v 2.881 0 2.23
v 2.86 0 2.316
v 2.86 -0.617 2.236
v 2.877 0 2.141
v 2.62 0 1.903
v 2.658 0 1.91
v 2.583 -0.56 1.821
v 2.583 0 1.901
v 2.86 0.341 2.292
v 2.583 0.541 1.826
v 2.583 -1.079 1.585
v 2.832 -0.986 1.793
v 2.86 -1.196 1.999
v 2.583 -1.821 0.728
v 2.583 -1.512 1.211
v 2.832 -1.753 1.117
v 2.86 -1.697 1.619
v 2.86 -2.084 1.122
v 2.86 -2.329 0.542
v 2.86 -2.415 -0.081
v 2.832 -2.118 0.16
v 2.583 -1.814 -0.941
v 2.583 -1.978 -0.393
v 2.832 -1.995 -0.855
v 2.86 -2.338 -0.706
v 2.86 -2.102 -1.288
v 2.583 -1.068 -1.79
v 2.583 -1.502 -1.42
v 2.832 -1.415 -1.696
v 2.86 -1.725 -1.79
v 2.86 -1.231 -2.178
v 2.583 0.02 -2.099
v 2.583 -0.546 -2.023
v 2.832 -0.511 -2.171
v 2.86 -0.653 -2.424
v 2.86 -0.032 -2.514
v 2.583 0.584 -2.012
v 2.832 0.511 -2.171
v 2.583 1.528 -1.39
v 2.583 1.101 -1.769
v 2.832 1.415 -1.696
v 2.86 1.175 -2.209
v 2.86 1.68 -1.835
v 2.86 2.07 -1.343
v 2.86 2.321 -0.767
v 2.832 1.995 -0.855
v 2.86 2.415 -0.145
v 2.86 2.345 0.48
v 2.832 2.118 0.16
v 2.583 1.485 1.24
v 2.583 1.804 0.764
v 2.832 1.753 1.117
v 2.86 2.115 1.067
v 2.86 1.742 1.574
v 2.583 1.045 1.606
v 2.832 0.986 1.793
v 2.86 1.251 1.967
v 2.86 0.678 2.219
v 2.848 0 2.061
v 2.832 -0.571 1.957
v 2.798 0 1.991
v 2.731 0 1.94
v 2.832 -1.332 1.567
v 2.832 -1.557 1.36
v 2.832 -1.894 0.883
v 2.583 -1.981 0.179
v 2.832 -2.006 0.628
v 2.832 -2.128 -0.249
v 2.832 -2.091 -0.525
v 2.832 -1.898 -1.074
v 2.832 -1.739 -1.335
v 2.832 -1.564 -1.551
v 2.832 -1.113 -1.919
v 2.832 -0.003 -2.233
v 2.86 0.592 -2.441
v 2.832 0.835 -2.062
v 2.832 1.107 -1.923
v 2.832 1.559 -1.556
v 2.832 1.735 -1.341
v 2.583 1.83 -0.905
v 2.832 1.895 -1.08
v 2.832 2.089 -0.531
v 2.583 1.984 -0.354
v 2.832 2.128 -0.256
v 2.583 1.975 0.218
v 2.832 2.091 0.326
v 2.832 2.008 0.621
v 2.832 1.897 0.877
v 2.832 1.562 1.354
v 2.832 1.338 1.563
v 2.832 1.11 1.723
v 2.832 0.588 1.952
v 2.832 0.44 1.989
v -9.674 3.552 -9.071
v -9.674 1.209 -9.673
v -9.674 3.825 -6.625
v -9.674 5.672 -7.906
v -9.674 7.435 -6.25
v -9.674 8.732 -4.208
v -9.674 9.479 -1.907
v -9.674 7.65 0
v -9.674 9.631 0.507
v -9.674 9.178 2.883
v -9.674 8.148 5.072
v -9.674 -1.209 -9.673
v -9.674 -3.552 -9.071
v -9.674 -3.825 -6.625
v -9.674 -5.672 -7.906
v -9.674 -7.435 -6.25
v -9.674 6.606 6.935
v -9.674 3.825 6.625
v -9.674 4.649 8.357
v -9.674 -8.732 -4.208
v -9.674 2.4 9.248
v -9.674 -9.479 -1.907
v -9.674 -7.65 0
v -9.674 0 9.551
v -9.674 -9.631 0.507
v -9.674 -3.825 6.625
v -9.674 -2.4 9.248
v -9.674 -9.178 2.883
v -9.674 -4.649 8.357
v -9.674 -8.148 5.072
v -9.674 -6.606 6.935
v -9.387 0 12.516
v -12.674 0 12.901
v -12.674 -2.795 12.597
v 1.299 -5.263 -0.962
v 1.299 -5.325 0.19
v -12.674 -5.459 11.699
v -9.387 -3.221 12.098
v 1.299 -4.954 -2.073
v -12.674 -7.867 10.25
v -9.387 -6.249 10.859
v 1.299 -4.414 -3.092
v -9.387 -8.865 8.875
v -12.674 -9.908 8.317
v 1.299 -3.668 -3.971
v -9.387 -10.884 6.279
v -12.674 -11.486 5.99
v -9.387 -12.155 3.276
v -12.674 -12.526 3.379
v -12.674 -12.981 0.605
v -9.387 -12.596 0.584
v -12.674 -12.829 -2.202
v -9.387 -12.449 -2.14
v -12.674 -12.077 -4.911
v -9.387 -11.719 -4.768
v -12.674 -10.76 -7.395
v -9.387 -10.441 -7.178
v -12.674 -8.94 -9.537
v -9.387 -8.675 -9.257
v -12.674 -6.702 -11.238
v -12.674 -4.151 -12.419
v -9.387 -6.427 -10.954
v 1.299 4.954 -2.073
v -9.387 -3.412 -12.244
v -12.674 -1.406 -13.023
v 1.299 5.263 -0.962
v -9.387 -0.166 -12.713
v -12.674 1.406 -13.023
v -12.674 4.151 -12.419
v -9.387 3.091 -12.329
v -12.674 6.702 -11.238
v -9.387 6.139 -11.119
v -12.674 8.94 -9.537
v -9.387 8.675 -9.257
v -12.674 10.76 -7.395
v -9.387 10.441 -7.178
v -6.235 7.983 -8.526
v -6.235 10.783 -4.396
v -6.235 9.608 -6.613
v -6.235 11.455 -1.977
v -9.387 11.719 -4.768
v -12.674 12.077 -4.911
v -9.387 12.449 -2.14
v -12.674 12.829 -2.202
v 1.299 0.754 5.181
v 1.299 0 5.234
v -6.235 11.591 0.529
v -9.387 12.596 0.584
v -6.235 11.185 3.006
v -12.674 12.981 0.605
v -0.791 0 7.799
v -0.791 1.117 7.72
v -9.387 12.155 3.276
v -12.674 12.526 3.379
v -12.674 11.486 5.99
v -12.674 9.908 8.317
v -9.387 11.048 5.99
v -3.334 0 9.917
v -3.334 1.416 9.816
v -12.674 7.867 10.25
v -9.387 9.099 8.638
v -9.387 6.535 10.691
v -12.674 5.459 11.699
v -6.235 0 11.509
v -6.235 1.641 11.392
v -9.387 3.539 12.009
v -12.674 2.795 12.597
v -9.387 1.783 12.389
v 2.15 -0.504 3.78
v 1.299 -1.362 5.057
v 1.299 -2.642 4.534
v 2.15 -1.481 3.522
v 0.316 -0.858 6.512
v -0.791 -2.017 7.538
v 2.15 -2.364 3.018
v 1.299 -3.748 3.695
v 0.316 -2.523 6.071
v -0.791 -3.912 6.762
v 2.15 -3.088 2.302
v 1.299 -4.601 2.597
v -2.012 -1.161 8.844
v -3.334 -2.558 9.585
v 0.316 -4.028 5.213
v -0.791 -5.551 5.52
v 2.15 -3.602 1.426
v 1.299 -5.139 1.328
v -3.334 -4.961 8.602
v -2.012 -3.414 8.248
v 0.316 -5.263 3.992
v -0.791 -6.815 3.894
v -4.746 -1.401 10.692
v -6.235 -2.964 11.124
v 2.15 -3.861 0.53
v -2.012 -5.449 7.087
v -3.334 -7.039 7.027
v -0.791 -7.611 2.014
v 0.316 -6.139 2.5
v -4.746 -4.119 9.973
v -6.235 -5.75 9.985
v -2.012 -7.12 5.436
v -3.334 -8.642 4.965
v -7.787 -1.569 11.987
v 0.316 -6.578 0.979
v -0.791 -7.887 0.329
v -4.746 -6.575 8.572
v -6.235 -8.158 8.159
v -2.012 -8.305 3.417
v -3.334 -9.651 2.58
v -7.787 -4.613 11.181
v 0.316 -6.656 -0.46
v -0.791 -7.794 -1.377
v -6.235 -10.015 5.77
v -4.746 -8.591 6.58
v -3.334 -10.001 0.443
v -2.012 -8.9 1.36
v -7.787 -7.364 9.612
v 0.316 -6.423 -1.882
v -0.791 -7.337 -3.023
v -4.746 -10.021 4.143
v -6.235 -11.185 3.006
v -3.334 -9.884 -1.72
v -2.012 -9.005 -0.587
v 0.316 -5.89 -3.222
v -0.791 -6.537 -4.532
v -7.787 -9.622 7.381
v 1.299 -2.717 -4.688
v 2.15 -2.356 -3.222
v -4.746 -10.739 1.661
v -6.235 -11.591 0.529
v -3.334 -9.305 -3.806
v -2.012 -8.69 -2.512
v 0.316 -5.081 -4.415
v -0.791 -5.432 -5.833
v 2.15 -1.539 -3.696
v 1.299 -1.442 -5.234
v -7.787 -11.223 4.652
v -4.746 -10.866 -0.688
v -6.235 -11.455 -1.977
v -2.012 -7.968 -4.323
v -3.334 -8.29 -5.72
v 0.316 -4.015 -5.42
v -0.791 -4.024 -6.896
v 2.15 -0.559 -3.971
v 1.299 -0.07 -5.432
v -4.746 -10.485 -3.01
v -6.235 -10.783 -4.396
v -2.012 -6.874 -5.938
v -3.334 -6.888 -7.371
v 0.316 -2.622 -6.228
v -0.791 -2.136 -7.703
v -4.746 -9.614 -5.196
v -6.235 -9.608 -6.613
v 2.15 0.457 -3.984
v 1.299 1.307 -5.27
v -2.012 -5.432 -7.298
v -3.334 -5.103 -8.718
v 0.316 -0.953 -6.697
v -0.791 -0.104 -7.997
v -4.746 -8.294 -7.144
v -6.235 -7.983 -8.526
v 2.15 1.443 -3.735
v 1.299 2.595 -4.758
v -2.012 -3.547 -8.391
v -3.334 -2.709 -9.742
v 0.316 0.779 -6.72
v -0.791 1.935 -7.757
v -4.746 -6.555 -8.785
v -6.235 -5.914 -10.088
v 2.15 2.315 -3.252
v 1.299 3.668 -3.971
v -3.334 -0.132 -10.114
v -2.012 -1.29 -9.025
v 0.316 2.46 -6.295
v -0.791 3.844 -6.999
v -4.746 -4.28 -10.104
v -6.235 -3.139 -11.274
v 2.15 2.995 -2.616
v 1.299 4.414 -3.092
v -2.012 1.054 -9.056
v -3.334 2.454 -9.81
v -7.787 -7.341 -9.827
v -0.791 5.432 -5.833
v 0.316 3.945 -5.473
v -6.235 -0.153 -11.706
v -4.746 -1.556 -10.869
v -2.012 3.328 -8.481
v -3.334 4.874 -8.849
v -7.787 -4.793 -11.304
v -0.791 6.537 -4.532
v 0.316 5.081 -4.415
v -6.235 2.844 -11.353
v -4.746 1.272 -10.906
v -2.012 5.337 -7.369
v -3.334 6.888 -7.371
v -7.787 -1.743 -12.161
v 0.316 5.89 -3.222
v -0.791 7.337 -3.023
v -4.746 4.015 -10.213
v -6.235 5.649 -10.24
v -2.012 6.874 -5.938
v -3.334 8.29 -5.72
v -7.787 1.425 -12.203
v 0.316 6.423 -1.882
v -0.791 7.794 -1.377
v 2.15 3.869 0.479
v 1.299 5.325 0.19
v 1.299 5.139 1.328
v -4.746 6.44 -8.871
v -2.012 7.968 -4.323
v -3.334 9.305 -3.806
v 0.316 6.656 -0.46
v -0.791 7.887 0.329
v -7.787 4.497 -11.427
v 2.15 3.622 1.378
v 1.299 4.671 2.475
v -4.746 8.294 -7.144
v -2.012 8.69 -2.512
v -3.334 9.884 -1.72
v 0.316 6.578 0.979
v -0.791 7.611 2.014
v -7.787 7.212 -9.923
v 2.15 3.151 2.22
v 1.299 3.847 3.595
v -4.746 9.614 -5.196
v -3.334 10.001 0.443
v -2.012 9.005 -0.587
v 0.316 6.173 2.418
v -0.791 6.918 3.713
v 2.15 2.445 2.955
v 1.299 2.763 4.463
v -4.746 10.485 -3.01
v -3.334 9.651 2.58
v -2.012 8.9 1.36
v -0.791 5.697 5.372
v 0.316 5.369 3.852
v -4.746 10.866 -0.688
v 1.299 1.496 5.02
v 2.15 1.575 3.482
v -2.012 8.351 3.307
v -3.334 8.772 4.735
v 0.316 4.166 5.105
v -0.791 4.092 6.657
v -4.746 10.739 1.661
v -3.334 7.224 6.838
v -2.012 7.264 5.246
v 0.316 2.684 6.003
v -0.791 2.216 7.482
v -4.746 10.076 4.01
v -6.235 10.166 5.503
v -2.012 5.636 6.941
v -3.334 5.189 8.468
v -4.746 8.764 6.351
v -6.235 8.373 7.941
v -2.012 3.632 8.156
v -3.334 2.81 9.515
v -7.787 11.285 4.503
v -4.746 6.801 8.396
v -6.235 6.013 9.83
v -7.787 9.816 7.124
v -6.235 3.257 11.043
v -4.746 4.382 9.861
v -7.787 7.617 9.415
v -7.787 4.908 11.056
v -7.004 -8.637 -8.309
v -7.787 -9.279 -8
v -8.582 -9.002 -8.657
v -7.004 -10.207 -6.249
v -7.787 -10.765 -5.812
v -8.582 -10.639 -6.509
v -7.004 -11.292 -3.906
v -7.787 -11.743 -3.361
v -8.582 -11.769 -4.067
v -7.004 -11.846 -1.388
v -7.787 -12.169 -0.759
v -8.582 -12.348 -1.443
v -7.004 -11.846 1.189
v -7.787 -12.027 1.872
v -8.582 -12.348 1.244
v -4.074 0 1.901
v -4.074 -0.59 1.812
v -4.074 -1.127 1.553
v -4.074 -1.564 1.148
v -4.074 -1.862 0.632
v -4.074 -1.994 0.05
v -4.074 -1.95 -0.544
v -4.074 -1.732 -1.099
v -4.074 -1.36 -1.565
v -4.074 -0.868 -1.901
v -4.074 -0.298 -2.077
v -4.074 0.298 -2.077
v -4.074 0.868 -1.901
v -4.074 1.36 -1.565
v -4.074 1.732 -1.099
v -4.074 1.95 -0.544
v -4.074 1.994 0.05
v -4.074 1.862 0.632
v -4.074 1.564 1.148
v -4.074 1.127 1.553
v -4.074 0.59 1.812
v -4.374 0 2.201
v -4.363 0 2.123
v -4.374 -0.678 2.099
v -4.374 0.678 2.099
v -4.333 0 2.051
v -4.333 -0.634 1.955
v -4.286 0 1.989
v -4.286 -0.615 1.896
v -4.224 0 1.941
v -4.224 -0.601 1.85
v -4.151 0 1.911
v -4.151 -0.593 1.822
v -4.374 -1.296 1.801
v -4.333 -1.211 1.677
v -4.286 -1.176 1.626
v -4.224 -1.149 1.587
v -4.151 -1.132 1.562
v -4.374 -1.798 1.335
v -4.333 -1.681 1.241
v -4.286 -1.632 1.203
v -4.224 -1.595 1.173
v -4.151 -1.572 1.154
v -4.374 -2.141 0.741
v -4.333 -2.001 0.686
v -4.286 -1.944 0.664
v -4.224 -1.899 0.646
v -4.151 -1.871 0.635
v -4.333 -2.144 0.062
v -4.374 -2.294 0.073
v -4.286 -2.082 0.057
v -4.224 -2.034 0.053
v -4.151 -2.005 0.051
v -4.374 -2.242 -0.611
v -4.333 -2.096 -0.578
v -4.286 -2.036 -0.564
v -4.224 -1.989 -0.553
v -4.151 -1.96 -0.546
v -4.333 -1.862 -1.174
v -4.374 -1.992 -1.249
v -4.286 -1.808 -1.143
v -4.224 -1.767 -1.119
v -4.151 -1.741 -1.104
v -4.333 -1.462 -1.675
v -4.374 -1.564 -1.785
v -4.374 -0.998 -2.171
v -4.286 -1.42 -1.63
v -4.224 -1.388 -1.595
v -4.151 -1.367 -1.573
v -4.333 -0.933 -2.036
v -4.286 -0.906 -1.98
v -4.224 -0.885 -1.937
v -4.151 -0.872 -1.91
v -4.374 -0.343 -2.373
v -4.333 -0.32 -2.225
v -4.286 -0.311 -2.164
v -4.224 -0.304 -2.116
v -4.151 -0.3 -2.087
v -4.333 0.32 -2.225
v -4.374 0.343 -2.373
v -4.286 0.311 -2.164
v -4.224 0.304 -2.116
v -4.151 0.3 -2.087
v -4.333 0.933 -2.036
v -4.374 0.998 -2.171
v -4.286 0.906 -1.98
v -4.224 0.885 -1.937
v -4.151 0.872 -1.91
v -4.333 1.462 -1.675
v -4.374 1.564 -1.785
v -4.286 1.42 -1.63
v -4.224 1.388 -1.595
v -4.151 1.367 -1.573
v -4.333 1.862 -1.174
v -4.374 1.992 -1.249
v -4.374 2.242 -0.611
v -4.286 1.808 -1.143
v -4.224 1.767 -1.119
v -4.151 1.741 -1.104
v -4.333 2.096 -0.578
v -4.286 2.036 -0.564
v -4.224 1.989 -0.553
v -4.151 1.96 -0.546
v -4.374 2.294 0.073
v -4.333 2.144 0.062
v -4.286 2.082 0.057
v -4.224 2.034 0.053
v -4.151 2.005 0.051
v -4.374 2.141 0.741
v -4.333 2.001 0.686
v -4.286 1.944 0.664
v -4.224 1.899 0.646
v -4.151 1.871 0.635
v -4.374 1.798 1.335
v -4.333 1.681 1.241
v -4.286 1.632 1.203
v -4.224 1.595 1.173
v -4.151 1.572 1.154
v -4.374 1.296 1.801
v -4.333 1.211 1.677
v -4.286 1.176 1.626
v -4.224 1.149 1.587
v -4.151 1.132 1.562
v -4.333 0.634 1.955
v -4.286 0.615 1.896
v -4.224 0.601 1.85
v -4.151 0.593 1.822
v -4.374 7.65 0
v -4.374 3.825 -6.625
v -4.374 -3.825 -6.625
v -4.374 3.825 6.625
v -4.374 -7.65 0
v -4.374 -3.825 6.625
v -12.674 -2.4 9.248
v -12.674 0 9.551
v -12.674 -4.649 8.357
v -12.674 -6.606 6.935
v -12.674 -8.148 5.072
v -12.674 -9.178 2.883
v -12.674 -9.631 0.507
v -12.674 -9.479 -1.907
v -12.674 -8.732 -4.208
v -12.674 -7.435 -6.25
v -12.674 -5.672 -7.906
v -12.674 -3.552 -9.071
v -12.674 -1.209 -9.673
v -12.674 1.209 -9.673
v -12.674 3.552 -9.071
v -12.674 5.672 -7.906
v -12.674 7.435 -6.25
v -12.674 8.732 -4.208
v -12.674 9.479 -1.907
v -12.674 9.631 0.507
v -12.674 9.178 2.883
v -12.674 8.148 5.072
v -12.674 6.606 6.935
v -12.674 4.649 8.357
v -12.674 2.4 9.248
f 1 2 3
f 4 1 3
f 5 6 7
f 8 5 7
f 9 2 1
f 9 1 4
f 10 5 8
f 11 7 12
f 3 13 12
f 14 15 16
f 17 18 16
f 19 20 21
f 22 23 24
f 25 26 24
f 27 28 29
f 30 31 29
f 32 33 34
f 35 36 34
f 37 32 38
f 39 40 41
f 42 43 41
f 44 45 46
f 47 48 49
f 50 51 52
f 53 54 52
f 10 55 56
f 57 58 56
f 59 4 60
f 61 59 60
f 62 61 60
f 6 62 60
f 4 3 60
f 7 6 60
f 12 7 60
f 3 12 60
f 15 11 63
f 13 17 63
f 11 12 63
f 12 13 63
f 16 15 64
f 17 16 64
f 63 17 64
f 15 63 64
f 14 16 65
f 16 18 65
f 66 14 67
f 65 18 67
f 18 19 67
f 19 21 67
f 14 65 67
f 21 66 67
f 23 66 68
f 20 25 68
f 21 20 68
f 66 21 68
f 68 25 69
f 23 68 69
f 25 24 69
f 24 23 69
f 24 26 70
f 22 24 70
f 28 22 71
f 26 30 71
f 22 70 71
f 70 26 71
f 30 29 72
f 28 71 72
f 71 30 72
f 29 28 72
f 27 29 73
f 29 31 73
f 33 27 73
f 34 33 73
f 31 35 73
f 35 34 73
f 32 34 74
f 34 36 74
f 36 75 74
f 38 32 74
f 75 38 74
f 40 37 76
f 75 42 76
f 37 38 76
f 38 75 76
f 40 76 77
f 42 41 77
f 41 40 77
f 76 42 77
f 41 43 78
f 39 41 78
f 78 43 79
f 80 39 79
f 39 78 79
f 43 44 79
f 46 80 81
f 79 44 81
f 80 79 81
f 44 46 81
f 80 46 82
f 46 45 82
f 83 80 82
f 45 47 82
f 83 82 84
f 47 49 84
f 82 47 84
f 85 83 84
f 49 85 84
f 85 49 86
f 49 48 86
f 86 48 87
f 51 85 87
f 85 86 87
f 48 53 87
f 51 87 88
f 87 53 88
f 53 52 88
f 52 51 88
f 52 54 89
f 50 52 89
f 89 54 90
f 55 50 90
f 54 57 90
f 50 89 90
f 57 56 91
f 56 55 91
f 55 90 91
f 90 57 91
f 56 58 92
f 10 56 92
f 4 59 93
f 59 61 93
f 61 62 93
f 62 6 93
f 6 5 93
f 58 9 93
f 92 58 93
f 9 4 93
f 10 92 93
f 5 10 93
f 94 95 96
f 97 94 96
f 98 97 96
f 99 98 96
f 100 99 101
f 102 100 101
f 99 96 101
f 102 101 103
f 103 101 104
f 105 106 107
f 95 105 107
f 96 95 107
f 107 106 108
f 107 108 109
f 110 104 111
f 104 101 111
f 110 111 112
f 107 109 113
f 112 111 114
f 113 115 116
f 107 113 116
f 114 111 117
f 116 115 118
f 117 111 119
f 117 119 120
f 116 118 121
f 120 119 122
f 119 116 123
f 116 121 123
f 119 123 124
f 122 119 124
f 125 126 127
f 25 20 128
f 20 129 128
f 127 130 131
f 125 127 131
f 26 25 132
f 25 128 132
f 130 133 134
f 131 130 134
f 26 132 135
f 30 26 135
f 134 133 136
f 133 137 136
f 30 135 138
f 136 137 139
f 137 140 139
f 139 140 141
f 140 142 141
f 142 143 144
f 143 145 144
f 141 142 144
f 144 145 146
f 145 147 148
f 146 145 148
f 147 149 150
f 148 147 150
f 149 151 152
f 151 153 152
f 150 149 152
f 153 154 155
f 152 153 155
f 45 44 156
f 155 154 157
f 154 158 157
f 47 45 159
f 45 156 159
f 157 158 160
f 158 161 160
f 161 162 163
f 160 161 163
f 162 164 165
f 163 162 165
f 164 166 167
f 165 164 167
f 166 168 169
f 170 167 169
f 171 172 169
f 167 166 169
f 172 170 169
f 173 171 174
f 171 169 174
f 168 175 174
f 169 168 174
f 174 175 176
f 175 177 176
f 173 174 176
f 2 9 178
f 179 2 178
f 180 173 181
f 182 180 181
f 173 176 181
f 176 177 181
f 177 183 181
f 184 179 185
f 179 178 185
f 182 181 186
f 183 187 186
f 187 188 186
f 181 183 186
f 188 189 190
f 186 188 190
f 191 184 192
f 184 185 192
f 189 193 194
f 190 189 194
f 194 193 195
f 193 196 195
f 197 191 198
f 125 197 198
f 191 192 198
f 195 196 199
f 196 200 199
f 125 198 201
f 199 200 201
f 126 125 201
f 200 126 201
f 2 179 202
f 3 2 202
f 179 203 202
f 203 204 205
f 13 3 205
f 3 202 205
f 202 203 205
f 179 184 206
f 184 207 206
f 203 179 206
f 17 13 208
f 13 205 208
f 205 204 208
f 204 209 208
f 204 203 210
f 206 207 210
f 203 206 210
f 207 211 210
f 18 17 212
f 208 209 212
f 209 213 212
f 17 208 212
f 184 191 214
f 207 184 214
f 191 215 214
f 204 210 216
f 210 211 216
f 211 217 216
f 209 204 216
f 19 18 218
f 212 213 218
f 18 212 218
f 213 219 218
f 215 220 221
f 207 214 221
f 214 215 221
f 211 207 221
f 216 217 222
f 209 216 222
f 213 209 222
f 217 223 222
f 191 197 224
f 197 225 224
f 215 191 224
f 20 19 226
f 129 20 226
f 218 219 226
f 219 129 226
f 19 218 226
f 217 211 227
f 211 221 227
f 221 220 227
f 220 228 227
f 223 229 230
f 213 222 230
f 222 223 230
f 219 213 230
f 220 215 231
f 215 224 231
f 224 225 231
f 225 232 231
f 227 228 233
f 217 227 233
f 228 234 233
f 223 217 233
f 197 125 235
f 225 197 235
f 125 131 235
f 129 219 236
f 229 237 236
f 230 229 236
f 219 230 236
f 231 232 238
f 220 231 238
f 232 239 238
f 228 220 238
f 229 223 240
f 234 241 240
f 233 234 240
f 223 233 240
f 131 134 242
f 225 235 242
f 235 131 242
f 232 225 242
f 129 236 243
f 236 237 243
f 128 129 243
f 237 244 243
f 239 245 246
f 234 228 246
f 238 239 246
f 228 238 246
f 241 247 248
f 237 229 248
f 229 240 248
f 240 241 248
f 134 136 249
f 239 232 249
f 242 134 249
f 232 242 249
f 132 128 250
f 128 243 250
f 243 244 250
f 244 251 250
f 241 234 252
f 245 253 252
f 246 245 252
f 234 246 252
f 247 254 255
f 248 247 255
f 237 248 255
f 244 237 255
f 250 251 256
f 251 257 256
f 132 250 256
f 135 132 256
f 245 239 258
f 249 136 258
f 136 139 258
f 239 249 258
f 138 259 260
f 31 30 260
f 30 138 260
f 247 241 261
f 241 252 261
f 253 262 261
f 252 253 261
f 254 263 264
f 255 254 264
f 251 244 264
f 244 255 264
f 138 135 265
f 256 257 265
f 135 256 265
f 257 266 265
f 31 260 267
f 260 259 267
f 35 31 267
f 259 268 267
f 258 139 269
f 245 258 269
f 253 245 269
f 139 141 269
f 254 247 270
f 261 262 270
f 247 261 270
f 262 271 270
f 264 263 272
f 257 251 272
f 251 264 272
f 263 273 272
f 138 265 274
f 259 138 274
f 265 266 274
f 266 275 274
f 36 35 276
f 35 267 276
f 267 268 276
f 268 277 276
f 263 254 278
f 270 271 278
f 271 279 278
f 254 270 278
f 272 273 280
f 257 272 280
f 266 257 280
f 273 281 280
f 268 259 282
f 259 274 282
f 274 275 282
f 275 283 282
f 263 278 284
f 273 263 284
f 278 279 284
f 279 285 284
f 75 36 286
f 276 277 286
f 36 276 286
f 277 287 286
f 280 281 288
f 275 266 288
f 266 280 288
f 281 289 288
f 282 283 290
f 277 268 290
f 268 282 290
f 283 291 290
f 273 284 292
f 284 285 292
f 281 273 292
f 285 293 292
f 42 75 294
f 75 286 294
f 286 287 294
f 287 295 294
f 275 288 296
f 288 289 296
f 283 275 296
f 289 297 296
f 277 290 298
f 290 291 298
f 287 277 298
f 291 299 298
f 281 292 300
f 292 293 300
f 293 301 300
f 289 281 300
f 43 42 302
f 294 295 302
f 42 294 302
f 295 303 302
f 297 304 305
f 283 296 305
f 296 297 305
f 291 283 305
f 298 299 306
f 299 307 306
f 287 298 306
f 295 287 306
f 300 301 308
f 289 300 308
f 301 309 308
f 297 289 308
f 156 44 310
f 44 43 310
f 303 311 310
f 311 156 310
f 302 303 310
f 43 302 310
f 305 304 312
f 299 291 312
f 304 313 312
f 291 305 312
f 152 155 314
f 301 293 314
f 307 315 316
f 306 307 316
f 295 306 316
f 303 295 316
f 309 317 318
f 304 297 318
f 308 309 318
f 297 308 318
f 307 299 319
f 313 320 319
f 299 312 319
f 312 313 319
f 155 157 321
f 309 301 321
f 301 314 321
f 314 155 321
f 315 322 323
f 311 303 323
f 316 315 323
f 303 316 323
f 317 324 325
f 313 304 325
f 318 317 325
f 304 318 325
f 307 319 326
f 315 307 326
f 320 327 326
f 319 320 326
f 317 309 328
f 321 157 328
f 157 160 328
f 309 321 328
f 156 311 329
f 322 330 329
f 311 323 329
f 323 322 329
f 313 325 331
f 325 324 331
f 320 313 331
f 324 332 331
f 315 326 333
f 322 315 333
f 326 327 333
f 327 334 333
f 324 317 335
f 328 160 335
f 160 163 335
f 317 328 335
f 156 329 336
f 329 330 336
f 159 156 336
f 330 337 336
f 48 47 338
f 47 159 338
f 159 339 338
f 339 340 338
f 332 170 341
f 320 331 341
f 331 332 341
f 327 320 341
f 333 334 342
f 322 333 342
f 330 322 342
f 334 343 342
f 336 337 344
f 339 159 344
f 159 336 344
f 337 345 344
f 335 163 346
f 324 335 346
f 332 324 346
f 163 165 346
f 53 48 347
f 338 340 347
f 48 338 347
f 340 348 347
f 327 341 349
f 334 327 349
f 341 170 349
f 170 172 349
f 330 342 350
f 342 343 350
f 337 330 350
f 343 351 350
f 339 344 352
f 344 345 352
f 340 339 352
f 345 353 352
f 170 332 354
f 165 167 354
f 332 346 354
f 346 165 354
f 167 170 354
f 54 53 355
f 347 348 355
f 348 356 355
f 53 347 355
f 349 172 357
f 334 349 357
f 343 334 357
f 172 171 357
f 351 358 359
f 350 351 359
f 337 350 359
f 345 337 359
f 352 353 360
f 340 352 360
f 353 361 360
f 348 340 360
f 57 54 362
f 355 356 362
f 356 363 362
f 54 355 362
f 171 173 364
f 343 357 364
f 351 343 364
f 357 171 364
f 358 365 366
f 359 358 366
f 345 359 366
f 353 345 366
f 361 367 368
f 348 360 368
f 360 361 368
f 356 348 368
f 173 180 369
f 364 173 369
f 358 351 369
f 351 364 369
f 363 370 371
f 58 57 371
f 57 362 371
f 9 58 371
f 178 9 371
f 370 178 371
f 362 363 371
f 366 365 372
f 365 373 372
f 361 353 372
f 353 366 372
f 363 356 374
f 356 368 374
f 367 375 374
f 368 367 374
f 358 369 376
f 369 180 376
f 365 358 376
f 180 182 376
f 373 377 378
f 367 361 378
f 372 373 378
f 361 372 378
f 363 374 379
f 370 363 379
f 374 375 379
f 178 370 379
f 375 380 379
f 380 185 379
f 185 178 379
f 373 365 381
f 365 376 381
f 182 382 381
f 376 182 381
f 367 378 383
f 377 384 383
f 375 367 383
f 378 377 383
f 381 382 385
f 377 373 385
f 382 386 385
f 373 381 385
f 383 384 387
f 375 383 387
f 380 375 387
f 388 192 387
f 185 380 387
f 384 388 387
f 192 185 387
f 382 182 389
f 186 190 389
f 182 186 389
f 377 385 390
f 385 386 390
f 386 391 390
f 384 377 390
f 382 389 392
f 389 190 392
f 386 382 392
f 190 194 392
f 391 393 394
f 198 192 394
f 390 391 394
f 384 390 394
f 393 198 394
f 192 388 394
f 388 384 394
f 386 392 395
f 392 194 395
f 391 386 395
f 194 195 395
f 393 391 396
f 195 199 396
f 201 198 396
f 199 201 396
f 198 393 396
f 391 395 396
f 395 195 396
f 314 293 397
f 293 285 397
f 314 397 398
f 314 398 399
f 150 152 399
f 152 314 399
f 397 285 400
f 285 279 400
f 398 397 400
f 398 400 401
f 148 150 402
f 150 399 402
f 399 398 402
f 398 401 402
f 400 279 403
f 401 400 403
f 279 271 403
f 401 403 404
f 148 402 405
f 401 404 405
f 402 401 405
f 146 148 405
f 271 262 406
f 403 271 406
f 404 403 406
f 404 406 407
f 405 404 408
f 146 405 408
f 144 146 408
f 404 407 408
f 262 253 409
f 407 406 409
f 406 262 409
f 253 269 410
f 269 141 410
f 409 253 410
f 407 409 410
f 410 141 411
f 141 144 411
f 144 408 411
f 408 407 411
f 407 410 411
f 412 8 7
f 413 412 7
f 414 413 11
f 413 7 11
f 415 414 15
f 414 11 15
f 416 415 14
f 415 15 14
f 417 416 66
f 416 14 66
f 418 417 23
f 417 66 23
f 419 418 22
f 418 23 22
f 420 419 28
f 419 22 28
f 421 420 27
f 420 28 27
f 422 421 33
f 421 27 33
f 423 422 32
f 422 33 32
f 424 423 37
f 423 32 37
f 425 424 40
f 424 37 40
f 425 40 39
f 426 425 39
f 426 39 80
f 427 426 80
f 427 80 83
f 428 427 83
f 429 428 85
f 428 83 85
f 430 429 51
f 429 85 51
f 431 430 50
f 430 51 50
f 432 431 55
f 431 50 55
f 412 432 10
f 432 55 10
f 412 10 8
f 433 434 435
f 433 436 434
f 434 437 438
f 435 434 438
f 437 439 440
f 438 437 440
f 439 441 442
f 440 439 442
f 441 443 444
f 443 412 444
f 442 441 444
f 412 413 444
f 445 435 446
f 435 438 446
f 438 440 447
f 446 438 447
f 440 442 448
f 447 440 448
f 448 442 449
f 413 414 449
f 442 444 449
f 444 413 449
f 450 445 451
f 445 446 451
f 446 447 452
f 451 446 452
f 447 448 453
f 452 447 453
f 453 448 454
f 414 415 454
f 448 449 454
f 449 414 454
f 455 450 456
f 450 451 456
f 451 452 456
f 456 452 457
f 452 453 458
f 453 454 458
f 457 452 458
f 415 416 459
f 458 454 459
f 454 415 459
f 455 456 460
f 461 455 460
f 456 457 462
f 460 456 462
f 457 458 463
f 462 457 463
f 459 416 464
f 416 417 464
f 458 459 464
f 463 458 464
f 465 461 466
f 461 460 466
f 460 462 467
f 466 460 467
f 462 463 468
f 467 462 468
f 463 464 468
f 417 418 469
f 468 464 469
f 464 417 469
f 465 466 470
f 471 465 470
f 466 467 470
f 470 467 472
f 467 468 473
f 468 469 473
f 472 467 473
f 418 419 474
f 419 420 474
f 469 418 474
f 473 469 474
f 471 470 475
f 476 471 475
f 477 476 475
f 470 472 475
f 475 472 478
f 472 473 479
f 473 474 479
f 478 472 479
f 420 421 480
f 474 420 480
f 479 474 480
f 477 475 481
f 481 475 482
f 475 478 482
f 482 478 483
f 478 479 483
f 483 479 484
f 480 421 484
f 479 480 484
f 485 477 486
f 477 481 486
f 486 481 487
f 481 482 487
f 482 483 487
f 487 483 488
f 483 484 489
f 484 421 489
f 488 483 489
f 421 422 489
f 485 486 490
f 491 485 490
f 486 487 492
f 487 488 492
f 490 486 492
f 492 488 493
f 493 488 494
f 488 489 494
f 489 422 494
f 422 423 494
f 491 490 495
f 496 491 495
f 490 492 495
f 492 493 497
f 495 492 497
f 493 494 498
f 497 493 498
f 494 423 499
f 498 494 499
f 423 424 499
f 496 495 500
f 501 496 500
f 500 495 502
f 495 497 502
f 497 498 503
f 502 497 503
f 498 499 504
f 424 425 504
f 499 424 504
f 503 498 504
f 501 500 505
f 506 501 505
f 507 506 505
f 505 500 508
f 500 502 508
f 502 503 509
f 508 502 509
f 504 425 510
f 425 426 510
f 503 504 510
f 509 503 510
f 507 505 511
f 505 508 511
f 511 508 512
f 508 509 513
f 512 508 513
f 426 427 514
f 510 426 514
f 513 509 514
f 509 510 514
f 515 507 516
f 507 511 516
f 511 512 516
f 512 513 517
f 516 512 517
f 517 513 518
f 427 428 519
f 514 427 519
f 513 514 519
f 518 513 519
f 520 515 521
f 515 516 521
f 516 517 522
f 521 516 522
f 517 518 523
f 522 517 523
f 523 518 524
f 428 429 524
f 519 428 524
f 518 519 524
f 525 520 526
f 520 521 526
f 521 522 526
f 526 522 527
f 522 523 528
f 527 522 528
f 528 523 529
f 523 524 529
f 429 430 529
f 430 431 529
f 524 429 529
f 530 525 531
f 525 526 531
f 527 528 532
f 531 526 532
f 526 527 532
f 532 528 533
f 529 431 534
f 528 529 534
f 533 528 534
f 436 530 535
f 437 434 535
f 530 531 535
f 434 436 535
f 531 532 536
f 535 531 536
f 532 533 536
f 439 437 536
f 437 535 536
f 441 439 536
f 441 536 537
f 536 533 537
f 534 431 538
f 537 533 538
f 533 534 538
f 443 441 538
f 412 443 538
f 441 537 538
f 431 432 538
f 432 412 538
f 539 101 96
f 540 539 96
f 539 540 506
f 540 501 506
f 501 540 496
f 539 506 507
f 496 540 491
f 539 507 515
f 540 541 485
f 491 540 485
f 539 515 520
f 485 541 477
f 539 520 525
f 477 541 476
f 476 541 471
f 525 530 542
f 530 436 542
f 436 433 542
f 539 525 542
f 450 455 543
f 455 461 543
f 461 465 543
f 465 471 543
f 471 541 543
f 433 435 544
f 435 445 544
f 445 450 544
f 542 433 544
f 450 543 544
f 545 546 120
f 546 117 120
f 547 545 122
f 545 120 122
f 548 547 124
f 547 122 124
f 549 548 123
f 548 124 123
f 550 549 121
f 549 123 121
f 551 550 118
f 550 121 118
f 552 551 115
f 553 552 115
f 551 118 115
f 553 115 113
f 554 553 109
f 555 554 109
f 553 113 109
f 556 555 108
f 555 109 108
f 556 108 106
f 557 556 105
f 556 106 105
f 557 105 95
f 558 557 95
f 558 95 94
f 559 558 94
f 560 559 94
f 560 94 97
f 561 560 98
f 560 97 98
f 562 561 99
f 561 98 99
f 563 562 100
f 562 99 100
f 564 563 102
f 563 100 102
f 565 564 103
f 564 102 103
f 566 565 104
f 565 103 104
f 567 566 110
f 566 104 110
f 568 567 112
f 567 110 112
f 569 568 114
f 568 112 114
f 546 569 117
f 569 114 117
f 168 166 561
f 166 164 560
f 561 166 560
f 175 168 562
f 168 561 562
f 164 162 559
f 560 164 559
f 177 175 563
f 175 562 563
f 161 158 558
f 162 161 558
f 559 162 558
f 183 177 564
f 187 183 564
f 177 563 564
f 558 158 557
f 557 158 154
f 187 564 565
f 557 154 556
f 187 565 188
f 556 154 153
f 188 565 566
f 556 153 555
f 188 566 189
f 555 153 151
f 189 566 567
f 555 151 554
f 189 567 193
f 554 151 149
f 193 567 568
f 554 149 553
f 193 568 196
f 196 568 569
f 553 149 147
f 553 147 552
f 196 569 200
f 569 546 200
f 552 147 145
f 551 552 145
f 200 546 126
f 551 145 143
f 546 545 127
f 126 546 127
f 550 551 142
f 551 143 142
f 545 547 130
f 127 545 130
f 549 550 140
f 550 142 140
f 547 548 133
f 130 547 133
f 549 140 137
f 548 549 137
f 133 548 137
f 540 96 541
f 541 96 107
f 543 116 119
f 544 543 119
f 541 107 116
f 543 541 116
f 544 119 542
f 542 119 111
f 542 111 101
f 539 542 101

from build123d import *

# Parameters (mm, degrees)
F2_R     = 0.3
F3_R     = 3.65
F4_DEPTH = 5.3


with BuildPart() as f1:
    # F0 (on Front) → F1 (revolve)
    with BuildSketch(Plane.XZ):
        with BuildLine():
            ThreePointArc((3.0264748034, 1.9009072963), (-3.1498022821, 9.7897663652), (-12.6735251966, 12.9009072963))
            Line((-12.6735251966, 12.9009072963), (-12.6735251966, 9.5509072963))
            Line((-12.6735251966, 9.5509072963), (-9.6735251966, 9.5509072963))
            Line((-9.6735251966, 9.5509072963), (-9.6735251966, 3.5509072963))
            Line((-9.6735251966, 3.5509072963), (-4.3735251966, 3.5509072963))
            Line((-4.3735251966, 3.5509072963), (-4.3735251966, 1.9009072963))
            Line((-4.3735251966, 1.9009072963), (3.0264748034, 1.9009072963))
        make_face()
    revolve(axis=Axis((-7.0268781856, 0, -0.0990927037), (1, 0, 0)))

    # F2
    f2_edges = [f1.edges().sort_by_distance(p)[0] for p in [
        (-4.373525, 0, -2.099093),
        (3.026475, 0, -2.099093),
    ]]
    fillet(f2_edges, radius=F2_R)

    # F3 (on face) → F4 (cut)
    with BuildSketch(Plane(origin=(-9.6735251966, 0, 0), x_dir=(0, -1, 0), z_dir=(-1, 0, 0))):
        Polygon((3.825, -6.625094339), (7.65, 0), (3.825, 6.625094339), (-3.825, 6.625094339), (-7.65, 0), (-3.825, -6.625094339), align=None)
        with Locations((0, -0.0990927037)):
            Circle(F3_R, mode=Mode.SUBTRACT)
    extrude(amount=-F4_DEPTH, mode=Mode.SUBTRACT)


solid = f1.part
